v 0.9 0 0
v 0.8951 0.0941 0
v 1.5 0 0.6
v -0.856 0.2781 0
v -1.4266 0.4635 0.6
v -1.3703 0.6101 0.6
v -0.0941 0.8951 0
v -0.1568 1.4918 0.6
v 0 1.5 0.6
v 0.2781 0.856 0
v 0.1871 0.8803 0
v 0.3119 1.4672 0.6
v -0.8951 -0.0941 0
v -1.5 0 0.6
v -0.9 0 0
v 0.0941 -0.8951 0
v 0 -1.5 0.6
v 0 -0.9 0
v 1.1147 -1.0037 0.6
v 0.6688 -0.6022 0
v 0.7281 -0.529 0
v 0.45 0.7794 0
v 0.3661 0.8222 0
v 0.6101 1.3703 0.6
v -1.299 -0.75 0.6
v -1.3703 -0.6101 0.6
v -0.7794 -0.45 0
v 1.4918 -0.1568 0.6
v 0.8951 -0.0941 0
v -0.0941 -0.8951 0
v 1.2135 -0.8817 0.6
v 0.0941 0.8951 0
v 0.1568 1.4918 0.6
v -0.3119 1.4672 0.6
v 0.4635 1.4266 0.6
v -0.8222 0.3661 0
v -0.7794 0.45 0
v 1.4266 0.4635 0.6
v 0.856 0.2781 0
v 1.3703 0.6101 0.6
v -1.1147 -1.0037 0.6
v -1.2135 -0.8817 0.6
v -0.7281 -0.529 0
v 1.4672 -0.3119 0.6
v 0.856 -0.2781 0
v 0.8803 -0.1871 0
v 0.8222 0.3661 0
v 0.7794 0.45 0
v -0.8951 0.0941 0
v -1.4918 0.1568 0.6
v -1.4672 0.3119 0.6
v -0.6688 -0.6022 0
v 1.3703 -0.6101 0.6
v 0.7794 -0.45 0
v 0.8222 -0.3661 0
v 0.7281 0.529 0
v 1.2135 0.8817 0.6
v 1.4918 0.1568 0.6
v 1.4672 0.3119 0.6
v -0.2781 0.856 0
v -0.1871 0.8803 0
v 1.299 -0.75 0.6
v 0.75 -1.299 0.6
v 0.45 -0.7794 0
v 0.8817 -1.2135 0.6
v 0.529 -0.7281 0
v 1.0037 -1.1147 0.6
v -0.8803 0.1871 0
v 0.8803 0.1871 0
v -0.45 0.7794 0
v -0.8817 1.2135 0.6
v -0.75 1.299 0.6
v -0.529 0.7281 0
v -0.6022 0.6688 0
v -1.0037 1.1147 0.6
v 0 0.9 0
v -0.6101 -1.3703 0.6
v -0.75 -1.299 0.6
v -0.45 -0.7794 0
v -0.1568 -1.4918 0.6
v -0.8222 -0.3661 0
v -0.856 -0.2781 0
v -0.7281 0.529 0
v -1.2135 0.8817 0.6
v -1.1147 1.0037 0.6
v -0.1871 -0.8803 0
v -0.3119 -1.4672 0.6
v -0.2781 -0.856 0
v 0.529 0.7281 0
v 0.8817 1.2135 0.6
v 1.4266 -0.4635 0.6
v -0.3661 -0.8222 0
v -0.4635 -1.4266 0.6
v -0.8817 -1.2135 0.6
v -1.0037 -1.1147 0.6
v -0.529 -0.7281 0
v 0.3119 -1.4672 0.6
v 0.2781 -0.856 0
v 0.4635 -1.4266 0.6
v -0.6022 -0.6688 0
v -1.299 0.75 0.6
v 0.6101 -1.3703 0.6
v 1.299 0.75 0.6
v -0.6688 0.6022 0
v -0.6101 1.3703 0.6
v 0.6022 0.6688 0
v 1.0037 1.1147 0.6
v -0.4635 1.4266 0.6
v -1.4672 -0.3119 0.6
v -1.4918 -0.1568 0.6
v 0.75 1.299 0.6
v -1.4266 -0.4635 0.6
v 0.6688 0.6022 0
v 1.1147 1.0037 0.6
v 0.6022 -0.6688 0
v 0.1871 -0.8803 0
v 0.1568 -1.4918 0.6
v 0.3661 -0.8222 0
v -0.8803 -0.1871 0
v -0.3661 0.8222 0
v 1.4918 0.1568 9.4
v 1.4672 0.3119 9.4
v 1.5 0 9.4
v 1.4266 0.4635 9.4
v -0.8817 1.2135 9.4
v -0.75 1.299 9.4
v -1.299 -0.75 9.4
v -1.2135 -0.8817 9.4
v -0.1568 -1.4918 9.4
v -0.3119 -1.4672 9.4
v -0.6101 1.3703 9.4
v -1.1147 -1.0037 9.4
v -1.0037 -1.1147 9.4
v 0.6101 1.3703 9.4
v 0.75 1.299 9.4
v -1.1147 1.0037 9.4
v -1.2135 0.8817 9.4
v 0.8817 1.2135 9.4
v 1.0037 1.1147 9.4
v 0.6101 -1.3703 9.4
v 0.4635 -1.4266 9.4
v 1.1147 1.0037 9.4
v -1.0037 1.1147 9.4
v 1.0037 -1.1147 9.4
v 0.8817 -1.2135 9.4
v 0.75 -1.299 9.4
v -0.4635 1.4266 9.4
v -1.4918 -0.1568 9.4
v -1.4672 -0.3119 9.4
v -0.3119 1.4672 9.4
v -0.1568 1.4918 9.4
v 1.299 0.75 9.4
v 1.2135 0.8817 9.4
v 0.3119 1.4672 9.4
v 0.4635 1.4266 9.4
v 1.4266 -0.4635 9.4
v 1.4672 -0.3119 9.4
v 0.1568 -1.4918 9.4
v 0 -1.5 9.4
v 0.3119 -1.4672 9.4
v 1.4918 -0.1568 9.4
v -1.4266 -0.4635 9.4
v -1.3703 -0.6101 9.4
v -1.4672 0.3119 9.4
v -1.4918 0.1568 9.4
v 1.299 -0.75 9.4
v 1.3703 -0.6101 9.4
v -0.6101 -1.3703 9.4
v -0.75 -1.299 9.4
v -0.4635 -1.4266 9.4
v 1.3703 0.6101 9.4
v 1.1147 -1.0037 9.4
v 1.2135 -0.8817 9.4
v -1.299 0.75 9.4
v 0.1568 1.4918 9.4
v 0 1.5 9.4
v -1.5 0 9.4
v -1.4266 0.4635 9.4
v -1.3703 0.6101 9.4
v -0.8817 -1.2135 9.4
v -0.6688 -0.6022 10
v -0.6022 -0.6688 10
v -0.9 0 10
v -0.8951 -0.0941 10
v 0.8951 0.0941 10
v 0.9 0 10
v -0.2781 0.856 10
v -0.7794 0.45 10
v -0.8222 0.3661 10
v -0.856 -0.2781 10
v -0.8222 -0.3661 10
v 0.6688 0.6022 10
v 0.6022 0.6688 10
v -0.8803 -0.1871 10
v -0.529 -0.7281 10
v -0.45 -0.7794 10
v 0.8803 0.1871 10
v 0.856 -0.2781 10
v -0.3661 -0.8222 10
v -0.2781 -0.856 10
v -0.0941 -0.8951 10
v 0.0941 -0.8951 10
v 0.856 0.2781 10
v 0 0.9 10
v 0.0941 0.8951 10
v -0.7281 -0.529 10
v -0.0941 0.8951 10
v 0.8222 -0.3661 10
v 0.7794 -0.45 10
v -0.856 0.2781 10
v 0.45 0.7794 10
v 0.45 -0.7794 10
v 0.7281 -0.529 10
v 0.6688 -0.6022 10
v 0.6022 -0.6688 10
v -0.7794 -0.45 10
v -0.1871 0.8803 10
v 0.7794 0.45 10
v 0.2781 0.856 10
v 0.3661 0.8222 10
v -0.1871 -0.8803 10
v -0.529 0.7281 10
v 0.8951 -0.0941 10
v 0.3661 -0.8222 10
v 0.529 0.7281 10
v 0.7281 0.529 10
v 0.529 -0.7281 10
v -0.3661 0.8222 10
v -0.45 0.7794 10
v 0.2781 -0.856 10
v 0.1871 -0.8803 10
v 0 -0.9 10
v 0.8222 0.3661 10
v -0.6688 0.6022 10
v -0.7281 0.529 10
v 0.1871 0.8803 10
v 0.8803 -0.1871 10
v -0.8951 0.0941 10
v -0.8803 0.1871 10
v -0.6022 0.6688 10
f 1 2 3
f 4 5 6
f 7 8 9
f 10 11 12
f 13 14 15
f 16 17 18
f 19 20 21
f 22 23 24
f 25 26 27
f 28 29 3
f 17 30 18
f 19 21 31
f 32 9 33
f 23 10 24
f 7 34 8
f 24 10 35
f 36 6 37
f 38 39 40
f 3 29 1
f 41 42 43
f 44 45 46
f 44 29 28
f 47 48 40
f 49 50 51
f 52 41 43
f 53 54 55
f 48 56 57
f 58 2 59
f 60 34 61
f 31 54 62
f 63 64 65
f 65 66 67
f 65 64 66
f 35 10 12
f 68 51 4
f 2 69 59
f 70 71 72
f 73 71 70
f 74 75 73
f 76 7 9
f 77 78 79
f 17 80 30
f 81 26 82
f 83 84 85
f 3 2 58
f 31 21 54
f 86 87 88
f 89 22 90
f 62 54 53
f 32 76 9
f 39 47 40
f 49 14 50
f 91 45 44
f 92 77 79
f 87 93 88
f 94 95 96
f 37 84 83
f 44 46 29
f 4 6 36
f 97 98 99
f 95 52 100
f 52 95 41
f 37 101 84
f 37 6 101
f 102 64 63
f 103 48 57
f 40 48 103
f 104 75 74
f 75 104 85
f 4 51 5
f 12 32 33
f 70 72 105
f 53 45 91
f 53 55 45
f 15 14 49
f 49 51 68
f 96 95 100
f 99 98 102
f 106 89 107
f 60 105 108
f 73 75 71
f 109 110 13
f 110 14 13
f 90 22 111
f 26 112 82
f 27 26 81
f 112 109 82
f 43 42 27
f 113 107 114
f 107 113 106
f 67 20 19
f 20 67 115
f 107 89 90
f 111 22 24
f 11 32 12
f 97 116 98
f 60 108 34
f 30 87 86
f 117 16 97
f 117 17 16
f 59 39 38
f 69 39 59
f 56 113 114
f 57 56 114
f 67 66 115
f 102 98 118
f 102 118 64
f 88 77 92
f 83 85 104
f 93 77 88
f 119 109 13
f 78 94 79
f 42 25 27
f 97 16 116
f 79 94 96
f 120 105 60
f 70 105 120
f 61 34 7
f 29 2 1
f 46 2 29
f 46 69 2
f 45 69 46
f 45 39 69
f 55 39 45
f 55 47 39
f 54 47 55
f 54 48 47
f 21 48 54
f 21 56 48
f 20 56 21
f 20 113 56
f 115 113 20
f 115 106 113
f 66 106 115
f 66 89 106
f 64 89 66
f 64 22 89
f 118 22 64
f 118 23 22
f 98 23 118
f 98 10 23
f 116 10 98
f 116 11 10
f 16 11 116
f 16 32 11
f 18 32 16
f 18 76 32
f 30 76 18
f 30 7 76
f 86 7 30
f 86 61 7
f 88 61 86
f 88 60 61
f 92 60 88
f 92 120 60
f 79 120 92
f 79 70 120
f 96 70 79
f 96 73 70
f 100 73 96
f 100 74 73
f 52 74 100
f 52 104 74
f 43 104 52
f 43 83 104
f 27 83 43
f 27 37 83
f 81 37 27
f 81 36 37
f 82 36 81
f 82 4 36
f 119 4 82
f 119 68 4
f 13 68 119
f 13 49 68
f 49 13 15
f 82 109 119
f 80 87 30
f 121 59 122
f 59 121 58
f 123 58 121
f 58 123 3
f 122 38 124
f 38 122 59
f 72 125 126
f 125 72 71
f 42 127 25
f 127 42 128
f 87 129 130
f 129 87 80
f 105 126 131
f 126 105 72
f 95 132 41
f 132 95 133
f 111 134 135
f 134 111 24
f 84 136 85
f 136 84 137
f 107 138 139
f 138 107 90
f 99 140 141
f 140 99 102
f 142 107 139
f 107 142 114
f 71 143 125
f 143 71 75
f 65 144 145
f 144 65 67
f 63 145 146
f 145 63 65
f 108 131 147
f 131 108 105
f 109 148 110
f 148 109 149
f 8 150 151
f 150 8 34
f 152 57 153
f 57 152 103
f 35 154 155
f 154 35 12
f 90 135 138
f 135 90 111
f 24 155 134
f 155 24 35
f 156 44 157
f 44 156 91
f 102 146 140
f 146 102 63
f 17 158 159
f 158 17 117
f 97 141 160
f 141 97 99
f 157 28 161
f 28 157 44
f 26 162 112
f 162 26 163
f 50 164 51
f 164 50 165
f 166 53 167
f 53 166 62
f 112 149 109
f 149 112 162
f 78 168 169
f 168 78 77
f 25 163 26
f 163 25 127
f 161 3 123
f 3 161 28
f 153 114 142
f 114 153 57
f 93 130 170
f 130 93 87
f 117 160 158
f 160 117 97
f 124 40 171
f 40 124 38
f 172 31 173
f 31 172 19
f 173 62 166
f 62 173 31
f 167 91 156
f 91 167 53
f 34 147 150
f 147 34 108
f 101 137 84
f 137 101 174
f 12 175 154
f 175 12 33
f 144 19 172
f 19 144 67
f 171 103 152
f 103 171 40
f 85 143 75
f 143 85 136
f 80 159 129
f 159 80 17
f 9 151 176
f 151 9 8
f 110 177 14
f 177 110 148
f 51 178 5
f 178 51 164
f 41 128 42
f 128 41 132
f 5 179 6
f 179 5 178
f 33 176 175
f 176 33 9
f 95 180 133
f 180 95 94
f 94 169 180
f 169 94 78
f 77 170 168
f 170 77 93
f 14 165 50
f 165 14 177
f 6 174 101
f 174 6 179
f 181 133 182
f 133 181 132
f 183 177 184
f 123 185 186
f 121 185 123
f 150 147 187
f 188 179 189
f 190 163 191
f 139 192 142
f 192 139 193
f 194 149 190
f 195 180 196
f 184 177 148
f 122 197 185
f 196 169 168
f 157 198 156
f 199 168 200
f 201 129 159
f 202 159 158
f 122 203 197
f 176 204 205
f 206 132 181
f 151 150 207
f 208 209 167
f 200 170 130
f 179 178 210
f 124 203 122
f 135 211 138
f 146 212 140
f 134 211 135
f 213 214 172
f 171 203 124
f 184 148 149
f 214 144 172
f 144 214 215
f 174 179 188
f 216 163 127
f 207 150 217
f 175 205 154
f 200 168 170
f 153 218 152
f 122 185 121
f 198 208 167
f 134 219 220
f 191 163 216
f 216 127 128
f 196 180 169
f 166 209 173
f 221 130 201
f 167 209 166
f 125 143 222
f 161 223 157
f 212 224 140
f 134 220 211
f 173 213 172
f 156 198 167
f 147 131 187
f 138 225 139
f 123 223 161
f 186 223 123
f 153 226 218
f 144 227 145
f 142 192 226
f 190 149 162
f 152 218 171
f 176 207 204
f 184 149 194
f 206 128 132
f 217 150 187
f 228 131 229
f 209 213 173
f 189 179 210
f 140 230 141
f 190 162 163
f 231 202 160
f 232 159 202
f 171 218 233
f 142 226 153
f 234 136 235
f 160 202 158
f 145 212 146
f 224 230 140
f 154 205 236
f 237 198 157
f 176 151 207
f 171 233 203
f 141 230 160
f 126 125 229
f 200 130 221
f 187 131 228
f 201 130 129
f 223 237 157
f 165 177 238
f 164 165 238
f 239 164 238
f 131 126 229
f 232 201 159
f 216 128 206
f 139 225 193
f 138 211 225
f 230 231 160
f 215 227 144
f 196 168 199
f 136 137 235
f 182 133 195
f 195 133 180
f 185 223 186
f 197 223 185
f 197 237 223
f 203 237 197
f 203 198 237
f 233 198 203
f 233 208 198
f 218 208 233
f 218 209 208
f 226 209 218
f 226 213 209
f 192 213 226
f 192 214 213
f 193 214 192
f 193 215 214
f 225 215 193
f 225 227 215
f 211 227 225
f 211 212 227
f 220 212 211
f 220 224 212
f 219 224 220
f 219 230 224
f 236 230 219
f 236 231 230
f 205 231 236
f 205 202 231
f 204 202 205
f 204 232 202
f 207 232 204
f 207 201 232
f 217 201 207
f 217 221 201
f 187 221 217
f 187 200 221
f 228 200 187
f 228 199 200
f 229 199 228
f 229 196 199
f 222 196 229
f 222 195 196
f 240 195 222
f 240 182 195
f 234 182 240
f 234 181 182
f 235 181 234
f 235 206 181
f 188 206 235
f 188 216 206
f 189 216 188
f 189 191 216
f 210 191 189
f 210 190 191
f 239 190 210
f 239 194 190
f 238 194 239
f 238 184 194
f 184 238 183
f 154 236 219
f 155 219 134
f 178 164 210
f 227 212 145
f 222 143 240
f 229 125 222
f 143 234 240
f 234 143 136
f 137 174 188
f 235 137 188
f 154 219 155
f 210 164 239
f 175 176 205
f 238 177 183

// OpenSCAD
// Chamfered dowel pin.
$fn = 60;
eps = 0.02;
diameter = 3;
length = 10;
chamfer = 0.6;
union() {
    cylinder(d1 = diameter - 2 * chamfer, d2 = diameter, h = chamfer);
    translate([0, 0, chamfer]) cylinder(d = diameter, h = length - 2 * chamfer);
    translate([0, 0, length - chamfer]) cylinder(d1 = diameter, d2 = diameter - 2 * chamfer, h = chamfer);
}
